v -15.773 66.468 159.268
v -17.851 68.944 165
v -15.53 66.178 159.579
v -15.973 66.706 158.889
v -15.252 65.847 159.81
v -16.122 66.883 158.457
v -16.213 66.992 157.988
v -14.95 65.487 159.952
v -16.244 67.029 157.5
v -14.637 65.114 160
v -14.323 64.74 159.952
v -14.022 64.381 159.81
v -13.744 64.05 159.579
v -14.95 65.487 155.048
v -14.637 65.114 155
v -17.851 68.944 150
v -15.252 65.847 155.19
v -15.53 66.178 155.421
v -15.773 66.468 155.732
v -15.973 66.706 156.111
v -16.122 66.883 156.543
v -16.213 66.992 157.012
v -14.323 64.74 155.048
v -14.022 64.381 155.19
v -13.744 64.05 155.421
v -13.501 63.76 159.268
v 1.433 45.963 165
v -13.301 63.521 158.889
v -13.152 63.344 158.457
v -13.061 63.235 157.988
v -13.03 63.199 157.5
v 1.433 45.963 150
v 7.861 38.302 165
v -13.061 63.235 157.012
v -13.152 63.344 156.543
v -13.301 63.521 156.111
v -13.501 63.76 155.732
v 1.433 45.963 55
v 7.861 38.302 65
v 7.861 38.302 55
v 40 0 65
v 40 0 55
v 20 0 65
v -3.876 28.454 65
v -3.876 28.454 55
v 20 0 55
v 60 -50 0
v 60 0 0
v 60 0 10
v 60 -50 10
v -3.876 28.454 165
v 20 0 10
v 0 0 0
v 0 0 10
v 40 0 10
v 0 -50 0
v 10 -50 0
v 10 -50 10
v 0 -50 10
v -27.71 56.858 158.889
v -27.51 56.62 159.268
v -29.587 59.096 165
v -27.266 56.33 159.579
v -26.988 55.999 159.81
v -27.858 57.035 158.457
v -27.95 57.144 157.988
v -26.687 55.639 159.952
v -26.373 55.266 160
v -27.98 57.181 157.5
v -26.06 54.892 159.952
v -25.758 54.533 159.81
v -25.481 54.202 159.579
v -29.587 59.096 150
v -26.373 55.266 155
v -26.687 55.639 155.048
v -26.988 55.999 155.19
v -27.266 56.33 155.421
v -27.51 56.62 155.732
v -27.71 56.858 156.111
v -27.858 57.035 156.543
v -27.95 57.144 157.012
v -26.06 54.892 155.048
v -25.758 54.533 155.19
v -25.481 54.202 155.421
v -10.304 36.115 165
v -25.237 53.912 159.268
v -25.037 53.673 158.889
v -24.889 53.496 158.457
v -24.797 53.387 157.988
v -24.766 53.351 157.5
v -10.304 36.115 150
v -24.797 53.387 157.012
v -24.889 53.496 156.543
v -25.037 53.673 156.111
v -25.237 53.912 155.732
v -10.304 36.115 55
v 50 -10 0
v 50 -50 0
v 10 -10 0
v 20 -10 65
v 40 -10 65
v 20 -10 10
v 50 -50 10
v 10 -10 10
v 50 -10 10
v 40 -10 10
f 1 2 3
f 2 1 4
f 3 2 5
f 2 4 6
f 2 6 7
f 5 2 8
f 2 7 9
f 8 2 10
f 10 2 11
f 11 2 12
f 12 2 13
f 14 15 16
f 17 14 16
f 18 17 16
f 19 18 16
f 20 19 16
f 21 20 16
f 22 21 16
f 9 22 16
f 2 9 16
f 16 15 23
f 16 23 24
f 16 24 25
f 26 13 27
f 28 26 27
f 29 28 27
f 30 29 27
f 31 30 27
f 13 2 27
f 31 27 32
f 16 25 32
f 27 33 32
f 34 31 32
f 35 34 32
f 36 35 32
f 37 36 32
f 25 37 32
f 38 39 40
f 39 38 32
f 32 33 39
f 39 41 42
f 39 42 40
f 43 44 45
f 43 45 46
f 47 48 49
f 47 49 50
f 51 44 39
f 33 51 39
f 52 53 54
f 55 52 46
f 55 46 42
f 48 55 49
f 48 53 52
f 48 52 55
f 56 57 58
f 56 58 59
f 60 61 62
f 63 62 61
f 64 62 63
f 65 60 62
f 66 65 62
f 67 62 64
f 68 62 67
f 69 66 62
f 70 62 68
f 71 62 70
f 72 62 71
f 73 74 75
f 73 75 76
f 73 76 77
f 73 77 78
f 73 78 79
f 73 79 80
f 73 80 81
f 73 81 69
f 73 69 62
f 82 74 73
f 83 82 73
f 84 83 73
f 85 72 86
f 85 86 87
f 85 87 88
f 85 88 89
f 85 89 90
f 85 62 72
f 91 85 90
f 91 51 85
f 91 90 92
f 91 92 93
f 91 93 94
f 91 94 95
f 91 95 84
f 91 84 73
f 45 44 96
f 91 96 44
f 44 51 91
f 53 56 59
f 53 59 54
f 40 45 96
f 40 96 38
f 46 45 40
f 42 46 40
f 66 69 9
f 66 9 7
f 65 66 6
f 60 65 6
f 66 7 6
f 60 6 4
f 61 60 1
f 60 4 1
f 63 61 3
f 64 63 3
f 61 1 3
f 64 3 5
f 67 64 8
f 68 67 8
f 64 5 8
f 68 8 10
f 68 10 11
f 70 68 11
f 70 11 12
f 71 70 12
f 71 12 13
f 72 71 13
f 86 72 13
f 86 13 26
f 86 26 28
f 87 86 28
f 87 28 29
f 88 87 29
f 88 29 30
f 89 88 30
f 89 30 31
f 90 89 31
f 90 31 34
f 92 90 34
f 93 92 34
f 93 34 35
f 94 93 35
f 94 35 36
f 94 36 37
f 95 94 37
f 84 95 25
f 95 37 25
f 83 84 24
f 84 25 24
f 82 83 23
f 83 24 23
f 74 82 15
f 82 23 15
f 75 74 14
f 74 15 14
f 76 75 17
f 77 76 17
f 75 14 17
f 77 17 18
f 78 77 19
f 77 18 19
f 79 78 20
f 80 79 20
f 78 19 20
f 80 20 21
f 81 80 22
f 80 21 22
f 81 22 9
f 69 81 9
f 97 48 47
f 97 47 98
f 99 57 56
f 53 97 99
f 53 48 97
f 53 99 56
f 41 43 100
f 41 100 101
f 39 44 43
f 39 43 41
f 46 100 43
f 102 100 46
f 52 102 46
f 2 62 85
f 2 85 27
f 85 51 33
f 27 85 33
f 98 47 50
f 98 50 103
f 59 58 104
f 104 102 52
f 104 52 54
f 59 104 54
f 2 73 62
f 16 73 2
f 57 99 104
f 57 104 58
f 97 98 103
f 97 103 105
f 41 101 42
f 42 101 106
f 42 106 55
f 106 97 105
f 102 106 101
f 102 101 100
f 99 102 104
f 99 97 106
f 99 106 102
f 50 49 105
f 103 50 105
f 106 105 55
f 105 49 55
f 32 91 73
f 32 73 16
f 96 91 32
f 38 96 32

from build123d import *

# Parameters (mm, degrees)
P_IDAT_VYSUNUT_M1_DEPTH  = 10
SKICA2_W                 = 20
SKICA2_H                 = 10
P_IDAT_VYSUNUT_M2_DEPTH  = 55
P_IDAT_VYSUNUT_M3_DEPTH  = 10
SKICA4_W                 = 15.320888863
SKICA4_H                 = 110
P_IDAT_VYSUNUT_M4_DEPTH  = 10
SKICA5_W                 = 15.320888863
SKICA5_H                 = 15
P_IDAT_VYSUNUT_M5_DEPTH  = 30
SKICA6_R                 = 2.5
ODEBRAT_VYSUNUT_M1_DEPTH = 187.809937293


with BuildPart() as part:
    # Skica1 → Přidat vysunutím1 (new body)
    with BuildSketch(Plane.XY):
        Polygon((0, 0), (60, 0), (60, -50), (50, -50), (50, -10), (10, -10), (10, -50), (0, -50), align=None)
    extrude(amount=P_IDAT_VYSUNUT_M1_DEPTH)

    # Skica2 → Přidat vysunutím2 (add)
    with BuildSketch(Plane.XY.offset(10)):
        with Locations((30, -5)):
            Rectangle(SKICA2_W, SKICA2_H)
    extrude(amount=P_IDAT_VYSUNUT_M2_DEPTH)

    # Skica3 → Přidat vysunutím3 (add)
    with BuildSketch(Plane.XY.offset(65)):
        Polygon((40, 0), (7.860619516, 38.302222156), (-3.875862261, 28.454144626), (20, 0), align=None)
    extrude(amount=-P_IDAT_VYSUNUT_M3_DEPTH)

    # Skica4 → Přidat vysunutím4 (add)
    with BuildSketch(Plane(origin=(-15.612344038, 18.606067096, 0), x_dir=(0.7660444431189743, 0.6427876096865438, 0), z_dir=(-0.6427876096865438, 0.7660444431189745, 0))):
        with Locations((22.981333294, -110)):
            Rectangle(SKICA4_W, SKICA4_H)
    extrude(amount=P_IDAT_VYSUNUT_M4_DEPTH)

    # Skica5 → Přidat vysunutím5 (add)
    with BuildSketch(Plane(origin=(-22.040220135, 26.266511527, 0), x_dir=(0.7660444431189743, 0.6427876096865438, 0), z_dir=(-0.6427876096865438, 0.7660444431189745, 0))):
        with Locations((22.981333294, -157.5)):
            Rectangle(SKICA5_W, SKICA5_H)
    extrude(amount=P_IDAT_VYSUNUT_M5_DEPTH)

    # Skica6 → Odebrat vysunutím1 (cut, through all)
    with BuildSketch(Plane(origin=(23.472963553, 19.69615506, 0), x_dir=(0, 0, -1), z_dir=(0.7660444431189746, 0.6427876096865435, 0))):
        with Locations(Location((-157.5, 59.288495613, 0), (0, 0, 90))):
            Circle(SKICA6_R)
    extrude(amount=-ODEBRAT_VYSUNUT_M1_DEPTH, mode=Mode.SUBTRACT)


solid = part.part
